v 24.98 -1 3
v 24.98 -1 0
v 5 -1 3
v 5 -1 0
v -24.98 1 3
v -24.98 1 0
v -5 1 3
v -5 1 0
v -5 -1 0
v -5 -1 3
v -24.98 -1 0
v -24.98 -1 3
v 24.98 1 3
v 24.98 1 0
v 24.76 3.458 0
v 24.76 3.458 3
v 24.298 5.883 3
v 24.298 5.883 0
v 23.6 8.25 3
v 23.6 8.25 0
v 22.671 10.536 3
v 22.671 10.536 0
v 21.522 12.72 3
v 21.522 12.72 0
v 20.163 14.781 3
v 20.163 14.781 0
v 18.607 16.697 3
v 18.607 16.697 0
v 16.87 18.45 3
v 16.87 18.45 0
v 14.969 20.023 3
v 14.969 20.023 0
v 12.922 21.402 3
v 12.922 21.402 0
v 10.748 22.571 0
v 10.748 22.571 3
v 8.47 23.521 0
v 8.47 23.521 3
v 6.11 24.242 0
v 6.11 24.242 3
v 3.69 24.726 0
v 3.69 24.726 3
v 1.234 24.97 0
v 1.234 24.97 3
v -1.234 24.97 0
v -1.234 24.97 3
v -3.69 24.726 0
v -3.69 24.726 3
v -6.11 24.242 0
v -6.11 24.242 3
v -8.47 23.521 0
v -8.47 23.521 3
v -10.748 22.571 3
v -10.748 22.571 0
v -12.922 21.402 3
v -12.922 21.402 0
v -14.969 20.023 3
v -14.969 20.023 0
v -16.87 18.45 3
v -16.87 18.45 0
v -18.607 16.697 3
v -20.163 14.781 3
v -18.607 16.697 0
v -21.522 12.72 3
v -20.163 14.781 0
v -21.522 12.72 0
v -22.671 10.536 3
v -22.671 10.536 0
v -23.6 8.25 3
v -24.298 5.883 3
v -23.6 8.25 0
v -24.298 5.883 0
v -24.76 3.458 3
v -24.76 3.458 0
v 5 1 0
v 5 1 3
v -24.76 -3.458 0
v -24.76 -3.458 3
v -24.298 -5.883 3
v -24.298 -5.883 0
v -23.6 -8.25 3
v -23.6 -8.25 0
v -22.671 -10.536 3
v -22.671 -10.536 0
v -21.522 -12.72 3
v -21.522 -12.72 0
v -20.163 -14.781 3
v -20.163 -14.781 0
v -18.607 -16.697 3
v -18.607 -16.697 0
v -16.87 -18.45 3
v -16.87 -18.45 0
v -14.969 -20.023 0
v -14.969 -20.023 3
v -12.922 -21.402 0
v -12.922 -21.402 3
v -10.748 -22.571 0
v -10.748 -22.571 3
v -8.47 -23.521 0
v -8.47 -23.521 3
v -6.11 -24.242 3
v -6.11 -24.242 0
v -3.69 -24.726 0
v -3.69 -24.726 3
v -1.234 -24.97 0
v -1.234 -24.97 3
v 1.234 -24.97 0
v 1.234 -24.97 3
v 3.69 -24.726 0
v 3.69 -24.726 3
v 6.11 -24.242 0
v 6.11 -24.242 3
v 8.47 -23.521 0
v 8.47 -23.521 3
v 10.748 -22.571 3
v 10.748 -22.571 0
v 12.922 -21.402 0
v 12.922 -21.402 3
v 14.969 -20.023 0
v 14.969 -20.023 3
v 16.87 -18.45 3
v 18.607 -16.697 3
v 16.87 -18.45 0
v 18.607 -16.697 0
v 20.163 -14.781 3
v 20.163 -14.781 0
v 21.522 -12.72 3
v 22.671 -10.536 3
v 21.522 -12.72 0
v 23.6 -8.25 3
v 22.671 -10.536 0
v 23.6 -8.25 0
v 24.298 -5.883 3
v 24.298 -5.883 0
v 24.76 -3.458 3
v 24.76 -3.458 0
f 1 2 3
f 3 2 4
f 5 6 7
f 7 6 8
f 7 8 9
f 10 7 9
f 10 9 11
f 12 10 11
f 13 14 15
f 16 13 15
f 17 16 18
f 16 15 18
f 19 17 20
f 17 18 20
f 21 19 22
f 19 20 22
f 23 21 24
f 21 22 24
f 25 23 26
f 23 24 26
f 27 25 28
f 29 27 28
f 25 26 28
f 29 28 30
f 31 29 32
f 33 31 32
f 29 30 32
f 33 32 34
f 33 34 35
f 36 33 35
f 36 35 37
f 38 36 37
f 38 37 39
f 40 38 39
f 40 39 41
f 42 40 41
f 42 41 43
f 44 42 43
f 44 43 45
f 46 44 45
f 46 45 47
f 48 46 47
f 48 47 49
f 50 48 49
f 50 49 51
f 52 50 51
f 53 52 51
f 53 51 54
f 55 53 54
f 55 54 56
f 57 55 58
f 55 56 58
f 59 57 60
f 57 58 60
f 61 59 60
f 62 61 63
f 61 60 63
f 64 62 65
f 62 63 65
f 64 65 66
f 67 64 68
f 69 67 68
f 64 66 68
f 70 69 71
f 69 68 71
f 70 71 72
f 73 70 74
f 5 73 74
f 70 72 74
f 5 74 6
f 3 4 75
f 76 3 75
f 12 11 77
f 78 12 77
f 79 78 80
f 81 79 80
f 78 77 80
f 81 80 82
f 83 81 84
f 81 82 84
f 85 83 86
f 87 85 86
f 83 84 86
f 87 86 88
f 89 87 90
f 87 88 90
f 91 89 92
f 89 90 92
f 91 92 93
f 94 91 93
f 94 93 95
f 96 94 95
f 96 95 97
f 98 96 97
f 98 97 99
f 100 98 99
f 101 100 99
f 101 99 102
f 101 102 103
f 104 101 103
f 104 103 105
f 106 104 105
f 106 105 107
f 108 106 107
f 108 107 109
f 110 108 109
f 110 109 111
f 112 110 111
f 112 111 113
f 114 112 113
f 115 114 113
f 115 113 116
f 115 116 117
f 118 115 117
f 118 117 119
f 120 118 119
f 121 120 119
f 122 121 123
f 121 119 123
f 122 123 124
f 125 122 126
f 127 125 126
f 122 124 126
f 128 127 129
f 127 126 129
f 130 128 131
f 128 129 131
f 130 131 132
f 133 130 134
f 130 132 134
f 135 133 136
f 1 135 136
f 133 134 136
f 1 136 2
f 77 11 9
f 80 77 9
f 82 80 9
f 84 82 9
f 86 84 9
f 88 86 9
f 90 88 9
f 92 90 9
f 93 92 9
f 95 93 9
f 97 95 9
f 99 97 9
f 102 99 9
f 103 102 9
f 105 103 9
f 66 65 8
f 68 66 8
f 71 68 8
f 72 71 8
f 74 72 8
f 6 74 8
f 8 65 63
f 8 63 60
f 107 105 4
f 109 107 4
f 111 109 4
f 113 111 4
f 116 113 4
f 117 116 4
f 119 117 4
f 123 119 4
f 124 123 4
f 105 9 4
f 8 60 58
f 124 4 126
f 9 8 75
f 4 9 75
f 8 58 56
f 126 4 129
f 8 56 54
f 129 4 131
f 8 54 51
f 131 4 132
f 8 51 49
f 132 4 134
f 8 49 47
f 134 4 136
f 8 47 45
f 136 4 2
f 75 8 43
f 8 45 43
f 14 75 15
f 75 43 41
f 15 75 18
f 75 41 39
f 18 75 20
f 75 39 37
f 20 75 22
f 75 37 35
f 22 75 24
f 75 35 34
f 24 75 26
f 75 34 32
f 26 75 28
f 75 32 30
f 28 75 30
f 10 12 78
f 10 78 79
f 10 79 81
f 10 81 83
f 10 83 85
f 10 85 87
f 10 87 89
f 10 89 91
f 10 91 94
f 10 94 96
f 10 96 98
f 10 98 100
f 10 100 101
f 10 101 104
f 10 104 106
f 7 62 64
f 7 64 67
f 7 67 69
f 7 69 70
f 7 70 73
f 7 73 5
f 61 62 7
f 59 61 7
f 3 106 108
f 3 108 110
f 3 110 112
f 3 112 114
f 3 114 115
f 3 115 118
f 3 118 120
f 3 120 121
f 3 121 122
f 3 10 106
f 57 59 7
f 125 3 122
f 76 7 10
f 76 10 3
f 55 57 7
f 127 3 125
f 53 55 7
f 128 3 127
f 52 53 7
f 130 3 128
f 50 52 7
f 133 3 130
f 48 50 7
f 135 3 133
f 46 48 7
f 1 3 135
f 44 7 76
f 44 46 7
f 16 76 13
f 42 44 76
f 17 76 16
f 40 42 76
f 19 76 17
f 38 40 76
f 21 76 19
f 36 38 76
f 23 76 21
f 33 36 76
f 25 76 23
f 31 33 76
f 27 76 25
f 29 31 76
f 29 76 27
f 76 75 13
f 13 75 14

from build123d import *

# Parameters (mm, degrees)
SKETCH1_R           = 25
BOSS_EXTRUDE1_DEPTH = 3
CUT_EXTRUDE1_DEPTH  = 3


with BuildPart() as part:
    # Sketch1 → Boss-Extrude1 (new body)
    with BuildSketch(Plane.XY):
        Circle(SKETCH1_R)
    extrude(amount=BOSS_EXTRUDE1_DEPTH)

    # Sketch2 → Cut-Extrude1 (cut)
    with BuildSketch(Plane(origin=(0, 0, 0), x_dir=(-1, 0, 0), z_dir=(0, 0, -1))):
        with BuildLine():
            Line((-24.979991994, -1), (-5, -1))
            Line((-5, -1), (-5, 1))
            Line((-5, 1), (-24.979991994, 1))
            ThreePointArc((-24.979991994, 1), (-25, 0), (-24.979991994, -1))
        make_face()
        with BuildLine():
            Line((5, 1), (5, -1))
            Line((5, -1), (24.979991994, -1))
            ThreePointArc((24.979991994, -1), (24.994997498, -0.50010007), (25, 0))
            ThreePointArc((25, 0), (24.994997498, 0.50010007), (24.979991994, 1))
            Line((24.979991994, 1), (5, 1))
        make_face()
    extrude(amount=-CUT_EXTRUDE1_DEPTH, mode=Mode.SUBTRACT)


solid = part.part
